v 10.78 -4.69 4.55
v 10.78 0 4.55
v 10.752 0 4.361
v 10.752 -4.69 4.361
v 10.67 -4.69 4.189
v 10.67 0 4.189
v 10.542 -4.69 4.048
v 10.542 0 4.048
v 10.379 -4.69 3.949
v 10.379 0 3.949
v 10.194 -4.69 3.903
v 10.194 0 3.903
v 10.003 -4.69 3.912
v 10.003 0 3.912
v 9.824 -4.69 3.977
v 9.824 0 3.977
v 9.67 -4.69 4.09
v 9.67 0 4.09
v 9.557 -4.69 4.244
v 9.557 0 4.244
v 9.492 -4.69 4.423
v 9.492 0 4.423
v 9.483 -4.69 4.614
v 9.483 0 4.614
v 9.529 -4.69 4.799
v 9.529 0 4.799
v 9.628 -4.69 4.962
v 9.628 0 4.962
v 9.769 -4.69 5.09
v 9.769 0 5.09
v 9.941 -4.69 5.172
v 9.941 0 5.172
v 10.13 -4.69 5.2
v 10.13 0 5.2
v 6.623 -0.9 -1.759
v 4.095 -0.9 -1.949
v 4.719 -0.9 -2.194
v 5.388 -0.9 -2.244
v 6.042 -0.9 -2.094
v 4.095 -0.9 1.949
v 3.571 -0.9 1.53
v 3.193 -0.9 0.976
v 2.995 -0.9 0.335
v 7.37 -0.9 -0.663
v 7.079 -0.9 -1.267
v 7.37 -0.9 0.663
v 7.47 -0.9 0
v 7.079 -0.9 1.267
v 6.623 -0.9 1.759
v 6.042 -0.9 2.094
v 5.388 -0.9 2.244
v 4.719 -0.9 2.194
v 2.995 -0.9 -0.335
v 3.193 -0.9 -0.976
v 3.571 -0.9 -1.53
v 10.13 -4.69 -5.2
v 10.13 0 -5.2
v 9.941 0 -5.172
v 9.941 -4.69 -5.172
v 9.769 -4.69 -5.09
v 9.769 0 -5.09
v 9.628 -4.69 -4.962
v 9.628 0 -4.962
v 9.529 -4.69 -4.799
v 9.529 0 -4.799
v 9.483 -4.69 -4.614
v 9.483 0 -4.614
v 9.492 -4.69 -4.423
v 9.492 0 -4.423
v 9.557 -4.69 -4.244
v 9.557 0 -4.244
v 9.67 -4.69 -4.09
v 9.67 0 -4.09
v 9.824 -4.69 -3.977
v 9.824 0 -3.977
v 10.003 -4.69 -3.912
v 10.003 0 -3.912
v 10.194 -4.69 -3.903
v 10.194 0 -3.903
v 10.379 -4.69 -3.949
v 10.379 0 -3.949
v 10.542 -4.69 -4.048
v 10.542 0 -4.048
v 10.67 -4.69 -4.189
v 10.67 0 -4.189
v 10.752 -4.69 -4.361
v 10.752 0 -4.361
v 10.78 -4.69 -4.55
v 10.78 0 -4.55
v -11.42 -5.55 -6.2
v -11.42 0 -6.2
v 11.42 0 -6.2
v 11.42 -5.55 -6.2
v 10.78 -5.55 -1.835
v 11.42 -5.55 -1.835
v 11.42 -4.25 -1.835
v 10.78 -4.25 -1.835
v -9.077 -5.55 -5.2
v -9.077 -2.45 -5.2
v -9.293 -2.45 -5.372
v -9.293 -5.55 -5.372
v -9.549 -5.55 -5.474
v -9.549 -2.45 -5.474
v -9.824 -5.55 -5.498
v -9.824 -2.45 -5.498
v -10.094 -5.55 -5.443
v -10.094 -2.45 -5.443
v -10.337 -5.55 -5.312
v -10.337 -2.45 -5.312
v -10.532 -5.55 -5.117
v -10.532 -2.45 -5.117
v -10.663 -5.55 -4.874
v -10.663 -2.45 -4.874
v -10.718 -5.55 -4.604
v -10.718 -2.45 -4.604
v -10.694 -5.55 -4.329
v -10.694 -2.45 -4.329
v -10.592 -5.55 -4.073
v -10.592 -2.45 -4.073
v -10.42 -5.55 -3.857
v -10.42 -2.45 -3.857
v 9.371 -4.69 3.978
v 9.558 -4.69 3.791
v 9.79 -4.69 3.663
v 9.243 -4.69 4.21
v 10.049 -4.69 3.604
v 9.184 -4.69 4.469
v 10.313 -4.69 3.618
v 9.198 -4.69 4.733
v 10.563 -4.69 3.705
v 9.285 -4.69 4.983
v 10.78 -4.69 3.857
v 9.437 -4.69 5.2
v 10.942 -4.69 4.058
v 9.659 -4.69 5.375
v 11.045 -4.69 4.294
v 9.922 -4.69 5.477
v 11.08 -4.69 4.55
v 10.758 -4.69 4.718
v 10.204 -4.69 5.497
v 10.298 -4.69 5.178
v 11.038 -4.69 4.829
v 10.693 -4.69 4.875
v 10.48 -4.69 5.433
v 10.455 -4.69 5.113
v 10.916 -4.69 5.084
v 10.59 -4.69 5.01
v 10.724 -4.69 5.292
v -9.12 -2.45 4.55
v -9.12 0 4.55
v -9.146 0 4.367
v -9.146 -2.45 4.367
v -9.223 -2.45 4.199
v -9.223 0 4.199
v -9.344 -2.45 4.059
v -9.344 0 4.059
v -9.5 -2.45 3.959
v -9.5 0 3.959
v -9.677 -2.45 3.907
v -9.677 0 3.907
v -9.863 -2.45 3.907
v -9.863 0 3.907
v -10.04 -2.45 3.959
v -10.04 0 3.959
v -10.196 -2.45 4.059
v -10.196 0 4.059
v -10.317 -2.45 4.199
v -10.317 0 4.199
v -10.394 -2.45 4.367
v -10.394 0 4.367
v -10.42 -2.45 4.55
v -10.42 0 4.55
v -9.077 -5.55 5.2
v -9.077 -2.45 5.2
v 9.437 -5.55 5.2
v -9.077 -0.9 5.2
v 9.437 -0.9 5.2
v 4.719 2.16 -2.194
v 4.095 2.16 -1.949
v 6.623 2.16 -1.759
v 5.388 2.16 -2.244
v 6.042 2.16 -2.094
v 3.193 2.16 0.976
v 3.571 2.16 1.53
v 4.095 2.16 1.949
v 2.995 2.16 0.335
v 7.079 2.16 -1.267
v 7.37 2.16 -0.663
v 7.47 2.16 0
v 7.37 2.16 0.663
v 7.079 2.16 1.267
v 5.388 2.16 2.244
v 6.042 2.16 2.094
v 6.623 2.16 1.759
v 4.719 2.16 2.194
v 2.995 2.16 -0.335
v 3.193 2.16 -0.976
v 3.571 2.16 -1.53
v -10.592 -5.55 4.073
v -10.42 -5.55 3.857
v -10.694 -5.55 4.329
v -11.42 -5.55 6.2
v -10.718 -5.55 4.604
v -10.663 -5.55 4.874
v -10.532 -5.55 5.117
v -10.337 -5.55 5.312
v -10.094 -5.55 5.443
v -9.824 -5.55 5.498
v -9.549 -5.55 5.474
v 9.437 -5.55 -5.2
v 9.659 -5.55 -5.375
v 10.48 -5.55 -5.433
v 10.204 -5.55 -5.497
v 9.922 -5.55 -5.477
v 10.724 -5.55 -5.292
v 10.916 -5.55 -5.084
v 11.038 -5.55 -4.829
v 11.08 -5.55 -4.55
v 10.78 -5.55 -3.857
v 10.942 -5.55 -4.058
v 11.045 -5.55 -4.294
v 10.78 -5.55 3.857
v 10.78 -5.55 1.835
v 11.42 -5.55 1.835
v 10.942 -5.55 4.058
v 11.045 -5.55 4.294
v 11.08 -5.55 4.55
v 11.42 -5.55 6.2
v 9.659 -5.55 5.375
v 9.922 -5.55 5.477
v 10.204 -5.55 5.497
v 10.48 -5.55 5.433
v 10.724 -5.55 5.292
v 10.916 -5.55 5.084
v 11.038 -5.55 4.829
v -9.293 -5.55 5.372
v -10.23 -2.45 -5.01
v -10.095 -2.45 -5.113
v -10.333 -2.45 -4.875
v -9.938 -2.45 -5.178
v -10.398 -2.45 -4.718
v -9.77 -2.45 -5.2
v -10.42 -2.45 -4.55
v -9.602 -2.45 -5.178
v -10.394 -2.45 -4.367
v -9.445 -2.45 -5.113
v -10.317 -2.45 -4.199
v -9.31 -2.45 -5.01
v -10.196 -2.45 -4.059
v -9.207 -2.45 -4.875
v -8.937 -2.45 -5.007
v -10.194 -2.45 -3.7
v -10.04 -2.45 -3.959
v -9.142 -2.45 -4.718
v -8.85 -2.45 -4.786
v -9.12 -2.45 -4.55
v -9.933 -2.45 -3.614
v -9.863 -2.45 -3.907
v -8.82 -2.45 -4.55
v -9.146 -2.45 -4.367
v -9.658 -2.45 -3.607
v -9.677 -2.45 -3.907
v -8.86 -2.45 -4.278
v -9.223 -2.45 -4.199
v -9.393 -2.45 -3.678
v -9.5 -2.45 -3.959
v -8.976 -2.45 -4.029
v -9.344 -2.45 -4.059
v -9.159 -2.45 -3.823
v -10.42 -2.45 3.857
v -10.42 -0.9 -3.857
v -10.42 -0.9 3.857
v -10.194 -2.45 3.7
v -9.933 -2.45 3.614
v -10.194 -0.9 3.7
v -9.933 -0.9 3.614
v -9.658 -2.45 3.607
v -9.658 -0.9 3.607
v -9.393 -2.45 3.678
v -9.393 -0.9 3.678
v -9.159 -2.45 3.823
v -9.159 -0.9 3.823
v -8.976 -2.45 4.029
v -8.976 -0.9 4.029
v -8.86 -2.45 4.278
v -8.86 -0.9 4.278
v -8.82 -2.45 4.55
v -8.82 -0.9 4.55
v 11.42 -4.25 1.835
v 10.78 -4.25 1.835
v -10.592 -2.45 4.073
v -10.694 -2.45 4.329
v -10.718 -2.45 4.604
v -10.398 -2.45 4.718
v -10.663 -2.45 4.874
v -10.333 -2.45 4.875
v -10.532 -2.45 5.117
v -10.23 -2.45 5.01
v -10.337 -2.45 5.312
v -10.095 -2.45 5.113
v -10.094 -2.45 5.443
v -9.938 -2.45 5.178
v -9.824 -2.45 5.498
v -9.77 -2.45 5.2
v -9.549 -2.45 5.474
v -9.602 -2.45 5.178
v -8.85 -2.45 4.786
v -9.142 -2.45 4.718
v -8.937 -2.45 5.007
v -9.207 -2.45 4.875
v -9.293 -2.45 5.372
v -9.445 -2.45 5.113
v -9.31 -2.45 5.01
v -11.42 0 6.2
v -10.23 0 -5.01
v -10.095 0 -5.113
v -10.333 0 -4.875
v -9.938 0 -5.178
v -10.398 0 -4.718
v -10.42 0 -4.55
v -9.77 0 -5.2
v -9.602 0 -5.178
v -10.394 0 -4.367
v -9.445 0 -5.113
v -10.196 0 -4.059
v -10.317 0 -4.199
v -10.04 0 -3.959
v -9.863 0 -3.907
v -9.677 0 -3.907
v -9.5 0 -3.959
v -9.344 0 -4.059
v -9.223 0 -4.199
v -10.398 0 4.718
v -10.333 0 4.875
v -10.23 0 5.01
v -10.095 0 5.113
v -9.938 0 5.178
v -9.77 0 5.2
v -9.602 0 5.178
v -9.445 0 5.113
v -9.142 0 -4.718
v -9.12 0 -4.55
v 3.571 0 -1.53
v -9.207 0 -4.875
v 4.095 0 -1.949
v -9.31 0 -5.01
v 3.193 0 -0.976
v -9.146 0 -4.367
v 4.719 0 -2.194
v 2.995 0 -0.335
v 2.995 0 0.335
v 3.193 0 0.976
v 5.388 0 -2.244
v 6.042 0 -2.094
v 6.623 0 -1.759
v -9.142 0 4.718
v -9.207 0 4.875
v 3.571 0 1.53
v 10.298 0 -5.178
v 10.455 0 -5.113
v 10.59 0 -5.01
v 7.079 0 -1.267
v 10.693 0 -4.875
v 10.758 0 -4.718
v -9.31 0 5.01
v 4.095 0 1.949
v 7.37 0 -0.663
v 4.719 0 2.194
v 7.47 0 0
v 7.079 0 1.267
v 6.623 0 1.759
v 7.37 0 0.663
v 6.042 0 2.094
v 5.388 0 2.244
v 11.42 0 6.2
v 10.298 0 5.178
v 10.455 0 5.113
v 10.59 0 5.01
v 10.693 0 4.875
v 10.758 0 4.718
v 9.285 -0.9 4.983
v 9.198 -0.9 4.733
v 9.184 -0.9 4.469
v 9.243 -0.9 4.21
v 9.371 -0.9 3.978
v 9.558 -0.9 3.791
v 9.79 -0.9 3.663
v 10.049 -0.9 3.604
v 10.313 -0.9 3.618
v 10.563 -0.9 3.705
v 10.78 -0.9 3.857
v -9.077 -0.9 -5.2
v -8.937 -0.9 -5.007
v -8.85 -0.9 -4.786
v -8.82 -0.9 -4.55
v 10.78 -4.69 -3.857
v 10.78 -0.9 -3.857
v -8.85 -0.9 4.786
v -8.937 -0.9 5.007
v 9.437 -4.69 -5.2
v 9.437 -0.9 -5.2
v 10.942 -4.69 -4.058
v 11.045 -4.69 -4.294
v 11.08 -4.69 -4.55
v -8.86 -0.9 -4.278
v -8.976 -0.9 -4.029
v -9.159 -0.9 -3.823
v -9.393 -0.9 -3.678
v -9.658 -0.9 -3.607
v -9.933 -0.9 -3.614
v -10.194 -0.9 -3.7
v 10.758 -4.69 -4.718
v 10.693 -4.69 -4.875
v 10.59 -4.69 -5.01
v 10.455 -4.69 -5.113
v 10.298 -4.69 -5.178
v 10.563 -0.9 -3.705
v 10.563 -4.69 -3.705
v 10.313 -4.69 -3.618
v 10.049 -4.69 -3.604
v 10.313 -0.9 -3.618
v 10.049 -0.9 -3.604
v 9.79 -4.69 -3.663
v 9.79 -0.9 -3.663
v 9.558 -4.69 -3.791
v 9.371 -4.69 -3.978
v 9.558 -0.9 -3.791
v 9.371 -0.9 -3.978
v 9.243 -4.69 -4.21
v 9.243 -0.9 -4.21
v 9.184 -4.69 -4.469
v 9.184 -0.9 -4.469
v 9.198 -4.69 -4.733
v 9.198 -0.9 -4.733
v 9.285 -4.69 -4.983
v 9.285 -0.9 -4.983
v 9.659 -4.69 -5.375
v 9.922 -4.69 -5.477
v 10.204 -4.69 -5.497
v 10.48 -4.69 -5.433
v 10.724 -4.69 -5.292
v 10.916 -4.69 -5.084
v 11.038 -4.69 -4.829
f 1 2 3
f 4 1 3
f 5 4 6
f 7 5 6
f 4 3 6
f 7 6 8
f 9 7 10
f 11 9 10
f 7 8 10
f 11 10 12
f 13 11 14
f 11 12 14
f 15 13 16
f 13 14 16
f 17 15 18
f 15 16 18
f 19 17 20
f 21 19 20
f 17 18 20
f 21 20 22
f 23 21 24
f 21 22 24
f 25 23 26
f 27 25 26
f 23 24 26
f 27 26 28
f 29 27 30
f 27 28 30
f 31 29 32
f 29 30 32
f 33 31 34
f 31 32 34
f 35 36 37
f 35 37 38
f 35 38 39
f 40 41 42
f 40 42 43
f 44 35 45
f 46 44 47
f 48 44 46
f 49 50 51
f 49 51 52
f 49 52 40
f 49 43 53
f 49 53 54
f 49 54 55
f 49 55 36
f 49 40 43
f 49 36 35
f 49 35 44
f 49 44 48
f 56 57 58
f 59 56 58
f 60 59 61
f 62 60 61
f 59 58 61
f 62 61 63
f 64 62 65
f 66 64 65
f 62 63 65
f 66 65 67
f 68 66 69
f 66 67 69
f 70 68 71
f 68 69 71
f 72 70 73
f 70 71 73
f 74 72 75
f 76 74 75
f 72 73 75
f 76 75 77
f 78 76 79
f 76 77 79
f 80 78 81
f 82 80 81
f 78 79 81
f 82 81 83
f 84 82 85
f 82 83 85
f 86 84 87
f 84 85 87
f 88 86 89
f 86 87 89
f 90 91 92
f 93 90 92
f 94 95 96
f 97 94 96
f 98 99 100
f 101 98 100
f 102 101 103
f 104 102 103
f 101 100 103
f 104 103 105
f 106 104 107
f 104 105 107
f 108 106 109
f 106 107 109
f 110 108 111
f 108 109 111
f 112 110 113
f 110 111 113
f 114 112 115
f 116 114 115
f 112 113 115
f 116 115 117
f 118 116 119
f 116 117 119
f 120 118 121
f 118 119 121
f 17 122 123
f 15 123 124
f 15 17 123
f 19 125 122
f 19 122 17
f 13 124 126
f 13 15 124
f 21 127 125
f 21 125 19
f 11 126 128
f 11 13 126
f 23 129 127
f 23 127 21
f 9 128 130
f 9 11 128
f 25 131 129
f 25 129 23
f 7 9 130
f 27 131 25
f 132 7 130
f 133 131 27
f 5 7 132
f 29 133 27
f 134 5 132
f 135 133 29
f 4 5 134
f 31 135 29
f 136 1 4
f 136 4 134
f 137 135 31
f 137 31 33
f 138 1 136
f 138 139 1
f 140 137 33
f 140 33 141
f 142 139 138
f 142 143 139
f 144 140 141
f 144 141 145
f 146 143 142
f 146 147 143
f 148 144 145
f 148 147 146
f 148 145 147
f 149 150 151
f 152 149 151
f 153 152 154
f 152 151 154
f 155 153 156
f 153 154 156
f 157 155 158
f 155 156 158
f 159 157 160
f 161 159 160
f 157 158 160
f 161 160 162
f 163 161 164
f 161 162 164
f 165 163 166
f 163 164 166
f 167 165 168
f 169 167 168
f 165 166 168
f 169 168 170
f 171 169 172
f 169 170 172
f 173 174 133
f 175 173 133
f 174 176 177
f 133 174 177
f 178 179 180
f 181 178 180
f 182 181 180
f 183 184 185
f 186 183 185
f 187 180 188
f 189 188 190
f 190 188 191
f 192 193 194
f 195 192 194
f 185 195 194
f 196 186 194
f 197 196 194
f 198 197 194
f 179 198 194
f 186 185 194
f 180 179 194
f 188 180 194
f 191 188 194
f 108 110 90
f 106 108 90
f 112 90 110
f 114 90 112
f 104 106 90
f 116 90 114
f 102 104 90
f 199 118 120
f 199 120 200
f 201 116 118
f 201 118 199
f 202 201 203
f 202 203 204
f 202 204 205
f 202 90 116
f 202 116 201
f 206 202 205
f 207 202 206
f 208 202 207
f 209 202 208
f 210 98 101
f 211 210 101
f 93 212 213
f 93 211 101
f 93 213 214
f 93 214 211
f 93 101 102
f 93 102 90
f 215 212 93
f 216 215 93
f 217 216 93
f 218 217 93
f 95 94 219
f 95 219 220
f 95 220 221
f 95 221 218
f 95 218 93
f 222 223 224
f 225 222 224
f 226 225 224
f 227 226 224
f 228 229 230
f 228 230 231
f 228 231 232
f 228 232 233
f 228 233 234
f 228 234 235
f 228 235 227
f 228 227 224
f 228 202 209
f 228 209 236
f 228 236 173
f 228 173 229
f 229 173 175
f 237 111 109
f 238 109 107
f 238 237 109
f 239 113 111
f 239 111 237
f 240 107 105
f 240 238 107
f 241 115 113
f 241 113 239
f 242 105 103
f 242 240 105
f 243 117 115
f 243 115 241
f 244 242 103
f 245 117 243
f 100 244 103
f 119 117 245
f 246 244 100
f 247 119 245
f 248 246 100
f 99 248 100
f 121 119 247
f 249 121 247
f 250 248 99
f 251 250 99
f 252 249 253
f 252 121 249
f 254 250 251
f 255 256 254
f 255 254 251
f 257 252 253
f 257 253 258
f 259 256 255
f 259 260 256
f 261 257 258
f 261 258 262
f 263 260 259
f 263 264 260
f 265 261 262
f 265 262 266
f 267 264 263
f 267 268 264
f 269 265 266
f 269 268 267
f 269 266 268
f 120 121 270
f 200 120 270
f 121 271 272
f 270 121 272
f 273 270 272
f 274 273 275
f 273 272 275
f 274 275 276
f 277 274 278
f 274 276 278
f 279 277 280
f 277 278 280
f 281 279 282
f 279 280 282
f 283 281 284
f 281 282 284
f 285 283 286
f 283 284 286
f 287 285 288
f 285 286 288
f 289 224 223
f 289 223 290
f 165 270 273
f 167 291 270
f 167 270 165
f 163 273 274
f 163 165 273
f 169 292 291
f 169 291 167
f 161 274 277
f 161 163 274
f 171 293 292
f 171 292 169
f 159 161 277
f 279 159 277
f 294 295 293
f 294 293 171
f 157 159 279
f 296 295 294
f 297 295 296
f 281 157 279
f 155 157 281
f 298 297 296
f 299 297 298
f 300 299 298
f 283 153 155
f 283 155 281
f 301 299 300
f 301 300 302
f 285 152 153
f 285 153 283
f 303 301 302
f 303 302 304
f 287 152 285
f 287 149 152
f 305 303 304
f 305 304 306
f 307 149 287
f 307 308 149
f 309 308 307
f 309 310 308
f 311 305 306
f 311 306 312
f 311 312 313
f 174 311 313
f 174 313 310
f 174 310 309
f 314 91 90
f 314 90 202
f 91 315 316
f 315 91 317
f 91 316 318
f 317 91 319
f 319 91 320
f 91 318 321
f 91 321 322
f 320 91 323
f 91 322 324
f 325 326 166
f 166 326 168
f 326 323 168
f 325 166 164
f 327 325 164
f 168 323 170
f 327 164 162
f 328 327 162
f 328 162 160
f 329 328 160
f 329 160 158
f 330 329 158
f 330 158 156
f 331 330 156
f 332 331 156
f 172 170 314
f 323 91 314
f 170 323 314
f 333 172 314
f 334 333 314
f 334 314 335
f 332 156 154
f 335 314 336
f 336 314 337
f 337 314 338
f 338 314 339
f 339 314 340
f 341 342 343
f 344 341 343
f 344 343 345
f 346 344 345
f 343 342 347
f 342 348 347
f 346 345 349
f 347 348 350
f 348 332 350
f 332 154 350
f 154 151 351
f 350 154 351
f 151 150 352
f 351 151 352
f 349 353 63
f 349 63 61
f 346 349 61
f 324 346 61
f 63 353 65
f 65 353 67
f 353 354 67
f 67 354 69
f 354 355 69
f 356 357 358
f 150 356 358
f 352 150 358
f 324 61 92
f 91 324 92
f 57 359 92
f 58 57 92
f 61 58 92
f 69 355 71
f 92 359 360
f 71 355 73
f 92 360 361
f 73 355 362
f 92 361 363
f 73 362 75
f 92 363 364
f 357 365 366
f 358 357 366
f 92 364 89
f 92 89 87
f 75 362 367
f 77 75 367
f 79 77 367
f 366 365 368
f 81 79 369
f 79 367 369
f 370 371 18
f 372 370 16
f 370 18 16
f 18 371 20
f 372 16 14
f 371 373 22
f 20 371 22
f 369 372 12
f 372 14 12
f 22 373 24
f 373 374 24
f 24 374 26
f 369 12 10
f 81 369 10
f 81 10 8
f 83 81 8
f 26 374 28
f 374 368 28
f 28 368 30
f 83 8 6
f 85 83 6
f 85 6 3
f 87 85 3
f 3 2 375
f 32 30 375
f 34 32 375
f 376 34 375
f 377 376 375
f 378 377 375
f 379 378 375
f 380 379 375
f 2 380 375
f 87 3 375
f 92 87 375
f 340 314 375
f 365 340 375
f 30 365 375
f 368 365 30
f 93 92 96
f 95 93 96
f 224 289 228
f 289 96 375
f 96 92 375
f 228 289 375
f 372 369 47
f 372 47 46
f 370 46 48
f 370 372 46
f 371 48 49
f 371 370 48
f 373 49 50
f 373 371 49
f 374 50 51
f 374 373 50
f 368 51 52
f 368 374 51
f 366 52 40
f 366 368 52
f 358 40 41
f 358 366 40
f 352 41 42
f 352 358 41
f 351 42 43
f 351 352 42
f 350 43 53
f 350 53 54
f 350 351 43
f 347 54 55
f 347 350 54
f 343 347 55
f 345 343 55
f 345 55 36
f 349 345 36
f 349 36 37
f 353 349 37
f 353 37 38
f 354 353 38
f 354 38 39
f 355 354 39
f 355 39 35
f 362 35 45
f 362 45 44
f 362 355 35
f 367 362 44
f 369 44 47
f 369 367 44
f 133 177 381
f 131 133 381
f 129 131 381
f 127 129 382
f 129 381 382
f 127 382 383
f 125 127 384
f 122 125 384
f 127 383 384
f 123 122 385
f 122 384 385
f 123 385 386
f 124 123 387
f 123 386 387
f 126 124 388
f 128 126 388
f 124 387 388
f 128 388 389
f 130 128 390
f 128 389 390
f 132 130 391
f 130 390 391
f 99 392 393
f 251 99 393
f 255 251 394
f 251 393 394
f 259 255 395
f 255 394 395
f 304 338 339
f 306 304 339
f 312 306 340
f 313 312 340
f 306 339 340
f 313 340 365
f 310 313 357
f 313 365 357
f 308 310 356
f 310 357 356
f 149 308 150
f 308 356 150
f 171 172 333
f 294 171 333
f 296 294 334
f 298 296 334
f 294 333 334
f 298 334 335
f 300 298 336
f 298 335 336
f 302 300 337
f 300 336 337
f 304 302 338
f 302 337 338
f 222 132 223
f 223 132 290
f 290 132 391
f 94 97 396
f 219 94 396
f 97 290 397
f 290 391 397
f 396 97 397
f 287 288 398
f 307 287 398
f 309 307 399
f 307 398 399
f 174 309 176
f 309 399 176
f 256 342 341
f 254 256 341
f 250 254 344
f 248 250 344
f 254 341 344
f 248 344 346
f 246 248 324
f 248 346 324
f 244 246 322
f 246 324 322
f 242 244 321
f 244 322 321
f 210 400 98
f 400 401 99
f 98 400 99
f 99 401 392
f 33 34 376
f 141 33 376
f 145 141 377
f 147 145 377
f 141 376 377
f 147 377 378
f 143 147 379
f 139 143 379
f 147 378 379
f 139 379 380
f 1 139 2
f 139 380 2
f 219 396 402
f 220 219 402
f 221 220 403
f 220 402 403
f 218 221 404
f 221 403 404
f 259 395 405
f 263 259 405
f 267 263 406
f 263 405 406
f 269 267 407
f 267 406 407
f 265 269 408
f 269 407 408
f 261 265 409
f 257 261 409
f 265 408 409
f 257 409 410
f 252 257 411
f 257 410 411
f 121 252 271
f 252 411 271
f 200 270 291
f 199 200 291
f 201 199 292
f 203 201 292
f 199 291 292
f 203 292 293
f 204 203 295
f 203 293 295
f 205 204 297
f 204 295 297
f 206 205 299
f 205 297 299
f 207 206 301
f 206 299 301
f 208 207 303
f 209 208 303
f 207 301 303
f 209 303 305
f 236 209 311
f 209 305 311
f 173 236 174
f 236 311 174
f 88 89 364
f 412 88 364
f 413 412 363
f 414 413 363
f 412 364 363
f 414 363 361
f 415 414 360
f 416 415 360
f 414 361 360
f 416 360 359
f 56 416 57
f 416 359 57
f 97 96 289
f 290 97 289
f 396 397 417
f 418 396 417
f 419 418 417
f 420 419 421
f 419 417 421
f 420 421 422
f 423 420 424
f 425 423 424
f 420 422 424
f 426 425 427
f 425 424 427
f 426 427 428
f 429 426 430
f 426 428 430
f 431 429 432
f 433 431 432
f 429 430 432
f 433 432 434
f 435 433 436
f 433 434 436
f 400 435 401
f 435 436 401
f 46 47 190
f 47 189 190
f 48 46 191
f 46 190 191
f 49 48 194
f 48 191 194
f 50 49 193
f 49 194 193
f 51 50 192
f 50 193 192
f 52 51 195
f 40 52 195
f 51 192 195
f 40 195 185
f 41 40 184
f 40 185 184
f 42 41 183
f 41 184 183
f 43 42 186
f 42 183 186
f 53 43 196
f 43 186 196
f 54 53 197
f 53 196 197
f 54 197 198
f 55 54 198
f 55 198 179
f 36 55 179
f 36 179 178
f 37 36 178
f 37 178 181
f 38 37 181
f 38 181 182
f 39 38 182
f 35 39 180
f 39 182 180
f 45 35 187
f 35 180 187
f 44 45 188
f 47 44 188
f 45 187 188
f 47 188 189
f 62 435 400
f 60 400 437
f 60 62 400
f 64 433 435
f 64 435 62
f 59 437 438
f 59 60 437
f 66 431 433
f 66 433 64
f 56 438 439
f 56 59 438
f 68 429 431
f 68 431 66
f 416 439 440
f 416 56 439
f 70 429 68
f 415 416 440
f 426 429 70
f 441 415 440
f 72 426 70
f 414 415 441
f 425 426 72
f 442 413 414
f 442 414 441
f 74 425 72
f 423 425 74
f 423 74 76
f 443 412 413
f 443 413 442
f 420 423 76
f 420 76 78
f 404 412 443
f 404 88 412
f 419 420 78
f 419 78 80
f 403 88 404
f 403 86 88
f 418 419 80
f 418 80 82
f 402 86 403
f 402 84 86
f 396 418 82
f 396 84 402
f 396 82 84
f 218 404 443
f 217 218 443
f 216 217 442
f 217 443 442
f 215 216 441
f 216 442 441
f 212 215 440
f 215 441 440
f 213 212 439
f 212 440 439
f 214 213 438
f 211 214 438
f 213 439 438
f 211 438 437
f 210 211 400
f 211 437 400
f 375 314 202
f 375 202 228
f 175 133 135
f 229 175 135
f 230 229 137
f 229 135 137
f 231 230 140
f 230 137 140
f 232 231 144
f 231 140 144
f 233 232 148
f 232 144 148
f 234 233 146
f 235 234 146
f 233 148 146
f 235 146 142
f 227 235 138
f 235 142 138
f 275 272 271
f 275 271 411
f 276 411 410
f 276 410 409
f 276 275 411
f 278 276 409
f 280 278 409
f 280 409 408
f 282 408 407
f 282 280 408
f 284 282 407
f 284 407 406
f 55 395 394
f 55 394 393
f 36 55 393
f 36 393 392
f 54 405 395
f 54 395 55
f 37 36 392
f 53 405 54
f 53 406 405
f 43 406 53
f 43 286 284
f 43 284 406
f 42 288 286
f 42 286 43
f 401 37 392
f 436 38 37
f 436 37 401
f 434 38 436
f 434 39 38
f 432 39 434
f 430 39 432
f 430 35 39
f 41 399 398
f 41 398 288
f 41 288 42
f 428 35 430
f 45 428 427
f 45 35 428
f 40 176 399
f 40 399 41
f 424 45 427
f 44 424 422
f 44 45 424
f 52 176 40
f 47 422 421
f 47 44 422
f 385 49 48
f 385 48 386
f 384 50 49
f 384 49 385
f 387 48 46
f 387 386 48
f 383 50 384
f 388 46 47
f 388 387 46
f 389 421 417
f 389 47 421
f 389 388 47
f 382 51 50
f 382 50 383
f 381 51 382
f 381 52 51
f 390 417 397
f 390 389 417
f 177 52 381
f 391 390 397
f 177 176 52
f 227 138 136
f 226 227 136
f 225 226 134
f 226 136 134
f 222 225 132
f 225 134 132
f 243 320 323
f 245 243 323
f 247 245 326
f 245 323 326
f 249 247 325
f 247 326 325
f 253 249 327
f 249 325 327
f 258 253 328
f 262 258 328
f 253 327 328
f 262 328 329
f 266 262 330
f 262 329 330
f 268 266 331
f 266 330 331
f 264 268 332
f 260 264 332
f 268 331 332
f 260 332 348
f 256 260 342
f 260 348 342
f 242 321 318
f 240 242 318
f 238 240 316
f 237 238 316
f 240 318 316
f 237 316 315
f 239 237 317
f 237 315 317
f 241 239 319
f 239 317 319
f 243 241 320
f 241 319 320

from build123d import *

# Parameters (mm, degrees)
F0_W     = 22.84
F0_H     = 12.4
F1_DEPTH = 5.55
F0_R     = 2.25
F2_DEPTH = 0.9
F3_DEPTH = 4.69
F4_DEPTH = 2.45
F5_W     = 1.3
F5_H     = 3.67
F6_DEPTH = 1
F7_DEPTH = 0.9
F8_DEPTH = 3.06


# Not quite as in the source:
# - a feature names something its author has since deleted; it is built from what else it names


with BuildPart() as f1:
    # F0 (on Front) → F1 (new body)
    with BuildSketch(Plane.XZ):
        Rectangle(F0_W, F0_H)
        with BuildLine():
            ThreePointArc((11.08, 4.55), (11.0017797887, 4.1725082782), (10.78, 3.857179677))
            Line((10.78, 3.857179677), (10.78, -3.857179677))
            ThreePointArc((10.78, -3.857179677), (11.0017797887, -4.1725082782), (11.08, -4.55))
            ThreePointArc((11.08, -4.55), (10.479514444, -5.4333683566), (9.437179677, -5.2))
            Line((9.437179677, -5.2), (-9.077179677, -5.2))
            ThreePointArc((-9.077179677, -5.2), (-10.4417514421, -5.2217514421), (-10.42, -3.857179677))
            Line((-10.42, -3.857179677), (-10.42, 3.857179677))
            ThreePointArc((-10.42, 3.857179677), (-10.4417514421, 5.2217514421), (-9.077179677, 5.2))
            Line((-9.077179677, 5.2), (9.437179677, 5.2))
            ThreePointArc((9.437179677, 5.2), (10.479514444, 5.4333683566), (11.08, 4.55))
        make_face(mode=Mode.SUBTRACT)
    extrude(amount=F1_DEPTH)

    # F0 (on Front) → F2 (join)
    with BuildSketch(Plane.XZ):
        with BuildLine():
            Line((10.78, -3.857179677), (10.78, 3.857179677))
            ThreePointArc((10.78, 3.857179677), (9.4582485579, 3.8782485579), (9.437179677, 5.2))
            Line((9.437179677, 5.2), (-9.077179677, 5.2))
            ThreePointArc((-9.077179677, 5.2), (-8.8866316434, 4.899514444), (-8.82, 4.55))
            ThreePointArc((-8.82, 4.55), (-9.3925082782, 3.6782202113), (-10.42, 3.857179677))
            Line((-10.42, 3.857179677), (-10.42, -3.857179677))
            ThreePointArc((-10.42, -3.857179677), (-9.3925082782, -3.6782202113), (-8.82, -4.55))
            ThreePointArc((-8.82, -4.55), (-8.8866316434, -4.899514444), (-9.077179677, -5.2))
            Line((-9.077179677, -5.2), (9.437179677, -5.2))
            ThreePointArc((9.437179677, -5.2), (9.4582485579, -3.8782485579), (10.78, -3.857179677))
        make_face()
        with Locations((5.22, 0)):
            Circle(F0_R, mode=Mode.SUBTRACT)
    extrude(amount=F2_DEPTH)

    # F0 (on Front) → F3 (join)
    with BuildSketch(Plane.XZ):
        with BuildLine():
            Line((10.78, 3.857179677), (10.78, 4.55))
            ThreePointArc((10.78, 4.55), (9.6703805922, 4.0903805922), (10.13, 5.2))
            Line((10.13, 5.2), (9.437179677, 5.2))
            ThreePointArc((9.437179677, 5.2), (9.4582485579, 3.8782485579), (10.78, 3.857179677))
        make_face()
        with BuildLine():
            ThreePointArc((10.13, 5.2), (10.5896194078, 5.0096194078), (10.78, 4.55))
            Line((10.78, 4.55), (10.78, 3.857179677))
            ThreePointArc((10.78, 3.857179677), (11.0017797887, 4.1725082782), (11.08, 4.55))
            ThreePointArc((11.08, 4.55), (10.479514444, 5.4333683566), (9.437179677, 5.2))
            Line((9.437179677, 5.2), (10.13, 5.2))
        make_face()
        with BuildLine():
            Line((10.78, -4.55), (10.78, -3.857179677))
            ThreePointArc((10.78, -3.857179677), (9.4582485579, -3.8782485579), (9.437179677, -5.2))
            Line((9.437179677, -5.2), (10.13, -5.2))
            ThreePointArc((10.13, -5.2), (9.6703805922, -4.0903805922), (10.78, -4.55))
        make_face()
        with BuildLine():
            ThreePointArc((11.08, -4.55), (11.0017797887, -4.1725082782), (10.78, -3.857179677))
            Line((10.78, -3.857179677), (10.78, -4.55))
            ThreePointArc((10.78, -4.55), (10.5896194078, -5.0096194078), (10.13, -5.2))
            Line((10.13, -5.2), (9.437179677, -5.2))
            ThreePointArc((9.437179677, -5.2), (10.479514444, -5.4333683566), (11.08, -4.55))
        make_face()
    extrude(amount=F3_DEPTH)

    # F0 (on Front) → F4 (join)
    with BuildSketch(Plane.XZ):
        with BuildLine():
            Line((-9.77, 5.2), (-9.077179677, 5.2))
            ThreePointArc((-9.077179677, 5.2), (-10.4417514421, 5.2217514421), (-10.42, 3.857179677))
            Line((-10.42, 3.857179677), (-10.42, 4.55))
            ThreePointArc((-10.42, 4.55), (-10.2296194078, 5.0096194078), (-9.77, 5.2))
        make_face()
        with BuildLine():
            ThreePointArc((-8.82, 4.55), (-8.8866316434, 4.899514444), (-9.077179677, 5.2))
            Line((-9.077179677, 5.2), (-9.77, 5.2))
            ThreePointArc((-9.77, 5.2), (-9.3103805922, 5.0096194078), (-9.12, 4.55))
            ThreePointArc((-9.12, 4.55), (-9.77, 3.9), (-10.42, 4.55))
            Line((-10.42, 4.55), (-10.42, 3.857179677))
            ThreePointArc((-10.42, 3.857179677), (-9.3925082782, 3.6782202113), (-8.82, 4.55))
        make_face()
        with BuildLine():
            ThreePointArc((-10.42, -3.857179677), (-10.4417514421, -5.2217514421), (-9.077179677, -5.2))
            Line((-9.077179677, -5.2), (-9.77, -5.2))
            ThreePointArc((-9.77, -5.2), (-10.2296194078, -5.0096194078), (-10.42, -4.55))
            Line((-10.42, -4.55), (-10.42, -3.857179677))
        make_face()
        with BuildLine():
            Line((-9.77, -5.2), (-9.077179677, -5.2))
            ThreePointArc((-9.077179677, -5.2), (-8.8866316434, -4.899514444), (-8.82, -4.55))
            ThreePointArc((-8.82, -4.55), (-9.3925082782, -3.6782202113), (-10.42, -3.857179677))
            Line((-10.42, -3.857179677), (-10.42, -4.55))
            ThreePointArc((-10.42, -4.55), (-9.77, -3.9), (-9.12, -4.55))
            ThreePointArc((-9.12, -4.55), (-9.3103805922, -5.0096194078), (-9.77, -5.2))
        make_face()
    extrude(amount=F4_DEPTH)

    # F5 (on face) → F6 (cut)
    with BuildSketch(Plane.YZ.offset(11.42)):
        with Locations((-4.9, 0)):
            Rectangle(F5_W, F5_H)
    extrude(amount=-F6_DEPTH, mode=Mode.SUBTRACT)


with BuildPart() as f7:
    # F0 (on Front) → F7 (new body)
    with BuildSketch(Plane.XZ):
        with Locations((5.22, 0)):
            Circle(F0_R)
    extrude(amount=F7_DEPTH)

    # F8 (add): a face of the model
    f8_faces = [f7.faces().sort_by_distance(p)[0] for p in [
        (5.22, -0.9, 0),
    ]]
    extrude(f8_faces, amount=-F8_DEPTH)


solid = Compound([f1.part, f7.part])
